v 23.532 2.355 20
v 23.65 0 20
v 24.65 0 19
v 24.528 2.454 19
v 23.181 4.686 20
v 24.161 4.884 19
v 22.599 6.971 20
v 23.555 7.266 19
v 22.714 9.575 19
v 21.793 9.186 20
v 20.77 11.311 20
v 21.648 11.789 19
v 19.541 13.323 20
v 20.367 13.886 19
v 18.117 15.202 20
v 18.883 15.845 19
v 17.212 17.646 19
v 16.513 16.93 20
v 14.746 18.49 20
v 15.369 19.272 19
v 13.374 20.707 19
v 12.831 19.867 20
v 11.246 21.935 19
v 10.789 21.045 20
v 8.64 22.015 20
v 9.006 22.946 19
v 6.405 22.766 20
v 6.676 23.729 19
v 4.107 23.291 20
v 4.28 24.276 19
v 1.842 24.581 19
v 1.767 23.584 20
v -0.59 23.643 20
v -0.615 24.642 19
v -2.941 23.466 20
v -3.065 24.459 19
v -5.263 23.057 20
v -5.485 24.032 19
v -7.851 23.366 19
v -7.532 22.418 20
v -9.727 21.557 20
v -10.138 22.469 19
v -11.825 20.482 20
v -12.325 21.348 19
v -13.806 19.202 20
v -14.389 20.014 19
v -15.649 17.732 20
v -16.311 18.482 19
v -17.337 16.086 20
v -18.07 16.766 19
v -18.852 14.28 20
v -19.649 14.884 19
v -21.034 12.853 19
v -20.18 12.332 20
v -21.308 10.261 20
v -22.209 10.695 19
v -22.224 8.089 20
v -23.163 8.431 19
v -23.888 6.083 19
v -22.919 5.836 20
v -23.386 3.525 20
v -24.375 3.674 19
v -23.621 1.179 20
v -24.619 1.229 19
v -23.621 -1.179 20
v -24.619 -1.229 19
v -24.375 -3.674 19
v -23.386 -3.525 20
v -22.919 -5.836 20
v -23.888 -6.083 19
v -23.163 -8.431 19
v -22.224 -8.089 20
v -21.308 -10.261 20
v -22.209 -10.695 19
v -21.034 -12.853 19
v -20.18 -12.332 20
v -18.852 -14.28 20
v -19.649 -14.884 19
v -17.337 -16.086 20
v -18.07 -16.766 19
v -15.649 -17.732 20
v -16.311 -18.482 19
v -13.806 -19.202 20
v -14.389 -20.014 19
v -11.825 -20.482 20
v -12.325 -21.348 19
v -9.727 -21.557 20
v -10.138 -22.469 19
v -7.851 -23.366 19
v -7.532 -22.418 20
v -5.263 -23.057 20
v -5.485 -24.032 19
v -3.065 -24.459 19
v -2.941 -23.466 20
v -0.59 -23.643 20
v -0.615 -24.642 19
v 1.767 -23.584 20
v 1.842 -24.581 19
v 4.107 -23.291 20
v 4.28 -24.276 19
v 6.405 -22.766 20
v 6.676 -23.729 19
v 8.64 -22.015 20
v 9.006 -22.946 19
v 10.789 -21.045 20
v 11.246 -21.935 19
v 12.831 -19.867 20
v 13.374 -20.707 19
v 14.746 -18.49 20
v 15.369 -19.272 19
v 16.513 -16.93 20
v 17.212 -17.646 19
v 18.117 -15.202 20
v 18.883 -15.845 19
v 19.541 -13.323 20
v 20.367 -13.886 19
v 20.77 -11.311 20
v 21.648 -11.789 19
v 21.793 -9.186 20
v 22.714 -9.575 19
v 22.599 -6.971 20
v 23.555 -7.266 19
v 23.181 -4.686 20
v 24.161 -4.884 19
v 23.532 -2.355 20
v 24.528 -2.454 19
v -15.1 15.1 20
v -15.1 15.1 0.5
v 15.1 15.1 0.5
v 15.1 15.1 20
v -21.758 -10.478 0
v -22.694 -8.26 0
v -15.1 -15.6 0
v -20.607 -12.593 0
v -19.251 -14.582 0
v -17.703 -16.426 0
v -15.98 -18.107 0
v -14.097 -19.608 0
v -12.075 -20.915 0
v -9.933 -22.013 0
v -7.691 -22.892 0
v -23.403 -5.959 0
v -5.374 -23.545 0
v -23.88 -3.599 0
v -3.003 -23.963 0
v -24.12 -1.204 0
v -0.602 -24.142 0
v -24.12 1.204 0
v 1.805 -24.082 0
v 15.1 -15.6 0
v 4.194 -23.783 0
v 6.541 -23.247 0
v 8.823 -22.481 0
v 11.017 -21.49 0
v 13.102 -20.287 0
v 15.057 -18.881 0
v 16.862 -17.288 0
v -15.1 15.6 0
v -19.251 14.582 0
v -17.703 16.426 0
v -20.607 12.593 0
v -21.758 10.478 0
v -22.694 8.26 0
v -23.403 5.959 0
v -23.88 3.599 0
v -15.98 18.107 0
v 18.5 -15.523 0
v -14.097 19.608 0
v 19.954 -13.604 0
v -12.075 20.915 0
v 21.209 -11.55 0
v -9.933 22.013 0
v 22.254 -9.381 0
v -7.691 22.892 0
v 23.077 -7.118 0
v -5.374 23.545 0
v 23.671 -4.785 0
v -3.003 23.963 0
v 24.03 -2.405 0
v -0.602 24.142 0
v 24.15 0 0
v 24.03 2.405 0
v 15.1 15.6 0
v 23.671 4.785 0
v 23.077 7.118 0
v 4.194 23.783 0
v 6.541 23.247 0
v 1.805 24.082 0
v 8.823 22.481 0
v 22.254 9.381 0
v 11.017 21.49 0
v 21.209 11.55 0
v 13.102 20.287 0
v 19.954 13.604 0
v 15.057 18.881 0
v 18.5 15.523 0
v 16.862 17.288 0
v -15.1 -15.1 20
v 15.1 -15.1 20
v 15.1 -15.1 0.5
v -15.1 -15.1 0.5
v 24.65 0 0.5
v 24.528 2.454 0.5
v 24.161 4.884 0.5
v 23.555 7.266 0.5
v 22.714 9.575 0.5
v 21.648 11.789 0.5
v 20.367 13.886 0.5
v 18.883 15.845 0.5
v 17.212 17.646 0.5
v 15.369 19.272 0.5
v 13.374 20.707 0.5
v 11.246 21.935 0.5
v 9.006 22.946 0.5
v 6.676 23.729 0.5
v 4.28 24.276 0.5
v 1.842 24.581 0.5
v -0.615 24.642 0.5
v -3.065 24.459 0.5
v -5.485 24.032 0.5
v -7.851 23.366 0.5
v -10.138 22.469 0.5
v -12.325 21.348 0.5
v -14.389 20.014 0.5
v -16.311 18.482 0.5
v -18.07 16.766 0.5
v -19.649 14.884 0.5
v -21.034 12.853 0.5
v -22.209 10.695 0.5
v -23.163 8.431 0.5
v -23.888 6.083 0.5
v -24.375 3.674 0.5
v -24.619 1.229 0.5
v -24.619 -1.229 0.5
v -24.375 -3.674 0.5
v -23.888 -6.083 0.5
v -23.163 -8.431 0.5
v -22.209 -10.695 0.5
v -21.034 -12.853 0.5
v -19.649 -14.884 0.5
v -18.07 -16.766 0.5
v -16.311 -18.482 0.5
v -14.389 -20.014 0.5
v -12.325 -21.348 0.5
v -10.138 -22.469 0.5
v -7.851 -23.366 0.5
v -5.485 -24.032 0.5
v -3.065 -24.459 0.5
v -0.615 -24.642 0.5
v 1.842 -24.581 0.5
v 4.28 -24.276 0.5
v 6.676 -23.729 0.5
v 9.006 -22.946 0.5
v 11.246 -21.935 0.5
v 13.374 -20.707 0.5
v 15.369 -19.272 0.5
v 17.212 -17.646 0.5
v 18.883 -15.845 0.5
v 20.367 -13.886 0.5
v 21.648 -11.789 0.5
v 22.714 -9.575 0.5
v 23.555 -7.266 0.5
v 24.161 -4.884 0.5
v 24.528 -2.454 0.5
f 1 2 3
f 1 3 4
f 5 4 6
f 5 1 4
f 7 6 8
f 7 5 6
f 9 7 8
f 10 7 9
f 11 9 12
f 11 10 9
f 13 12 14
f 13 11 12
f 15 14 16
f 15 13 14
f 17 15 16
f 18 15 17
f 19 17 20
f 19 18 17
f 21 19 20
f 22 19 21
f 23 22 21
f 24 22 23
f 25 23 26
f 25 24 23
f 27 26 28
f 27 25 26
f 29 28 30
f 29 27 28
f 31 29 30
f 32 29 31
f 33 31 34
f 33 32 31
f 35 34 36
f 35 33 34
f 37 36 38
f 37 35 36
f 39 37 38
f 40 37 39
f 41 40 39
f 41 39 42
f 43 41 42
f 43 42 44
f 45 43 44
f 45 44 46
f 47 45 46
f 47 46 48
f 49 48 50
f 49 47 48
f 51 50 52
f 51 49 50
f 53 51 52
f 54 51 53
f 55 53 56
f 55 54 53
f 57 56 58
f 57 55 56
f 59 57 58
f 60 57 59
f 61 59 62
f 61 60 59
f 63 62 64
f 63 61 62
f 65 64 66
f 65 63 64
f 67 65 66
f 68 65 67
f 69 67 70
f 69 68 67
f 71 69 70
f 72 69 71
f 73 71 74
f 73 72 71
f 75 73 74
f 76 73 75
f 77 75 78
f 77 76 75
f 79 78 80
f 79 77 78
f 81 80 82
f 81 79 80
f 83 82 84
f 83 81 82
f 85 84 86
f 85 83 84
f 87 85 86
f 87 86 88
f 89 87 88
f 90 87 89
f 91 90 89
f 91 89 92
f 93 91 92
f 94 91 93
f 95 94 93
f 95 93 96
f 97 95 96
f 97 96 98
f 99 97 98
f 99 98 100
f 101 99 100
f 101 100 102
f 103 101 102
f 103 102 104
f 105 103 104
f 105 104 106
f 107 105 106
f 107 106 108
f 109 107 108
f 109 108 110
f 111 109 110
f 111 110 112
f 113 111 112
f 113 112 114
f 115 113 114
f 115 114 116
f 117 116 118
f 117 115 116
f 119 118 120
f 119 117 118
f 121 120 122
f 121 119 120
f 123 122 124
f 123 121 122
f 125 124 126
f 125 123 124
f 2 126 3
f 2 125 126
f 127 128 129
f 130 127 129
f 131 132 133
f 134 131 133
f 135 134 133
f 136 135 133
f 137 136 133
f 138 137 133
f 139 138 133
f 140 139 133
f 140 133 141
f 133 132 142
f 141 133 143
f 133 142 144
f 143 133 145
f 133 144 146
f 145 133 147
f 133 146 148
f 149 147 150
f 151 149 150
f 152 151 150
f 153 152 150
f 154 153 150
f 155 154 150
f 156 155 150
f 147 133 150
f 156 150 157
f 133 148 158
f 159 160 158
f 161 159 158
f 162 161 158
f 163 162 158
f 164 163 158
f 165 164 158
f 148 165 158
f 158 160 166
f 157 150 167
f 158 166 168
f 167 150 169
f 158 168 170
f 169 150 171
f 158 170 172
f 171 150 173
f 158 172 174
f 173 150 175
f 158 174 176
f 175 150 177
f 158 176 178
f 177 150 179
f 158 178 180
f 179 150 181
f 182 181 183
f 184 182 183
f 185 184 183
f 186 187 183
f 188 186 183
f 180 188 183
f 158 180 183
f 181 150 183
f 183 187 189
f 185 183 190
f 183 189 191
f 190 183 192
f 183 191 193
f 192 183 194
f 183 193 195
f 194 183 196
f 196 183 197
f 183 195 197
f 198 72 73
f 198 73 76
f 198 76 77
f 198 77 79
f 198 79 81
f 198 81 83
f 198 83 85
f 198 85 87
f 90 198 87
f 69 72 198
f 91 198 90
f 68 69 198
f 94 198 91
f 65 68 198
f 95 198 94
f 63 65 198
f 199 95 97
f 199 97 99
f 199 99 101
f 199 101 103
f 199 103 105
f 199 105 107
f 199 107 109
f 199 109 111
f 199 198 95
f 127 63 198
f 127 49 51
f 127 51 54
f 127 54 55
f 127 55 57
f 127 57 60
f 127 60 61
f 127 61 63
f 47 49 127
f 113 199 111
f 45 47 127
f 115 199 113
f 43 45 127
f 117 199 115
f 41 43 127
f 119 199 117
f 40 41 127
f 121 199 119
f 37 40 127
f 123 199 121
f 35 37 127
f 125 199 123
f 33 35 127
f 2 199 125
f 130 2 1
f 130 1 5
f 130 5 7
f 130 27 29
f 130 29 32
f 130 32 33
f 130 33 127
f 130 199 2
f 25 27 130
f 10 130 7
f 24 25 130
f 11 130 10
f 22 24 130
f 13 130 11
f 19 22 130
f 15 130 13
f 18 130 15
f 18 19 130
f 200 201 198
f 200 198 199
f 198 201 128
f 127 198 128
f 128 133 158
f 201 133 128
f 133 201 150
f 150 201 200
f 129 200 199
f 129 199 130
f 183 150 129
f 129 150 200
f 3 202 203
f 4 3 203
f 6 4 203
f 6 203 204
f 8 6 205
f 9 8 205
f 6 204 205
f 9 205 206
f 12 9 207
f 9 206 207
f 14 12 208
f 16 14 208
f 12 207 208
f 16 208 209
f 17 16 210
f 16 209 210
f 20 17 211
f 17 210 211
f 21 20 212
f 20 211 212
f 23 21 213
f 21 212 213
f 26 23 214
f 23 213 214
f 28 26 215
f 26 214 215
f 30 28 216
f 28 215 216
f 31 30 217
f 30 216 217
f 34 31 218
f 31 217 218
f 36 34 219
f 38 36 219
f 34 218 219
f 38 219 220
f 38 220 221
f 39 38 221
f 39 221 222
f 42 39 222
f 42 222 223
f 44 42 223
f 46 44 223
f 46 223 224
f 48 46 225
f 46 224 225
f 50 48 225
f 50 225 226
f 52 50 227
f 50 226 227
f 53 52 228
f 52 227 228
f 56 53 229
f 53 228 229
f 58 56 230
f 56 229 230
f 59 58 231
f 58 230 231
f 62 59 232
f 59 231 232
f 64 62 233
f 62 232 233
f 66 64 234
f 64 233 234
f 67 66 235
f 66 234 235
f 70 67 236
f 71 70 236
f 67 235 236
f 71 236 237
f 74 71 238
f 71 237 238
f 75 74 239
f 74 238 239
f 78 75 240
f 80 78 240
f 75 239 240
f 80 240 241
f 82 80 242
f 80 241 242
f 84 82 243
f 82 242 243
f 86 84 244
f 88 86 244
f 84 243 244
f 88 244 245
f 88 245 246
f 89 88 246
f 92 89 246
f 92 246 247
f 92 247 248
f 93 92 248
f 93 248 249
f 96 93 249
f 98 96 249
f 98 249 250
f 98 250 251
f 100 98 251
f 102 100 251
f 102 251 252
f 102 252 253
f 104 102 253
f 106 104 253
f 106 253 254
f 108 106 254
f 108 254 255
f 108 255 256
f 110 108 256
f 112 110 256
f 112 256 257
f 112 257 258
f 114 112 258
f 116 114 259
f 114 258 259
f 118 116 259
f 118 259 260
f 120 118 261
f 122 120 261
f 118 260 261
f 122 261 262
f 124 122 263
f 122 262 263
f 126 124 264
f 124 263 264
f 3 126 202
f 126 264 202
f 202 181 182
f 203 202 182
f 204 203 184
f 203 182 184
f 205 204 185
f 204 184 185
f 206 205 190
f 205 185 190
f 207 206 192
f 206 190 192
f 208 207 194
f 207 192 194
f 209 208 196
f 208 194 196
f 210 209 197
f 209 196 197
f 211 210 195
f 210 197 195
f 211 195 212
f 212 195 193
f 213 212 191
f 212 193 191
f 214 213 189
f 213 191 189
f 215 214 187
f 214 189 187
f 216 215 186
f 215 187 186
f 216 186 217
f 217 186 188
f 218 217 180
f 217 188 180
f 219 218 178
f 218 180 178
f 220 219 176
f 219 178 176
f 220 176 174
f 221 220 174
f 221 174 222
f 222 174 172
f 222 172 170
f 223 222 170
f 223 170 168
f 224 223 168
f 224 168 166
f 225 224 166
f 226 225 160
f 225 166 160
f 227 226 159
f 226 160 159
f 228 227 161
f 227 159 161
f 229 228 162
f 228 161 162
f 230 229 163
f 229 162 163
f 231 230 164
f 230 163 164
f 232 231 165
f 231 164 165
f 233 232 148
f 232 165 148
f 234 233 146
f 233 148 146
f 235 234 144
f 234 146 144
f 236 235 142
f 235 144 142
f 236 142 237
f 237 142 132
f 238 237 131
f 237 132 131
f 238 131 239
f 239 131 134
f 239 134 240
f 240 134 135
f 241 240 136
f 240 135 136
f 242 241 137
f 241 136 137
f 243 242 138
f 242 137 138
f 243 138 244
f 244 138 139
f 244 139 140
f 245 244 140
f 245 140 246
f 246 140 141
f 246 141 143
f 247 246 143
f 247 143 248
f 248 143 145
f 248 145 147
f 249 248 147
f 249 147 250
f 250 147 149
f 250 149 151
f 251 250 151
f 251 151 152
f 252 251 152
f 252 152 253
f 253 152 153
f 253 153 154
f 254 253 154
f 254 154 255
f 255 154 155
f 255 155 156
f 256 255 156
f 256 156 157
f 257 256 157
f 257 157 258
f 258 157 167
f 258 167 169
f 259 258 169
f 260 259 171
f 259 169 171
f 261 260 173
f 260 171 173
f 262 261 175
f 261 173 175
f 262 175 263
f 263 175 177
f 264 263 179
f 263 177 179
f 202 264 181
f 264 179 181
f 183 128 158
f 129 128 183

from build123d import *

# Parameters (mm, degrees)
BOX320_W          = 30.2
BOX320_H          = 30.2
BOX320_DEPTH      = 20
CYLINDER816_R     = 24.65
CYLINDER816_DEPTH = 20
CHAMFER006_SIZE   = 0.5
CHAMFER005_SIZE   = 1
CHAMFER007_SIZE   = 0.5


with BuildPart() as krychle320:
    # Box320 → Box320 (new body)
    with BuildSketch(Plane(origin=(-15.1, -15.1, 0), x_dir=(1, 0, 0), z_dir=(0, 0, 1))):
        with Locations((15.1, 15.1)):
            Rectangle(BOX320_W, BOX320_H)
    extrude(amount=BOX320_DEPTH)


with BuildPart() as chamfer007:
    # Cylinder816 → Cylinder816 (new body)
    with BuildSketch(Plane.XY):
        Circle(CYLINDER816_R)
    extrude(amount=CYLINDER816_DEPTH)

    # Cut349: cut Krychle320
    add(krychle320.part, mode=Mode.SUBTRACT)

    # Chamfer006
    chamfer006_edges = [chamfer007.edges().sort_by_distance(p)[0] for p in [
        (0, -15.1, 0),
        (0, 15.1, 0),
    ]]
    chamfer(chamfer006_edges, length=CHAMFER006_SIZE)

    # Chamfer005
    chamfer005_edges = [chamfer007.edges().sort_by_distance(p)[0] for p in [
        (-24.65, 0, 20),
    ]]
    chamfer(chamfer005_edges, length=CHAMFER005_SIZE)

    # Chamfer007
    chamfer007_edges = [chamfer007.edges().sort_by_distance(p)[0] for p in [
        (-24.65, 0, 0),
    ]]
    chamfer(chamfer007_edges, length=CHAMFER007_SIZE)


solid = chamfer007.part
